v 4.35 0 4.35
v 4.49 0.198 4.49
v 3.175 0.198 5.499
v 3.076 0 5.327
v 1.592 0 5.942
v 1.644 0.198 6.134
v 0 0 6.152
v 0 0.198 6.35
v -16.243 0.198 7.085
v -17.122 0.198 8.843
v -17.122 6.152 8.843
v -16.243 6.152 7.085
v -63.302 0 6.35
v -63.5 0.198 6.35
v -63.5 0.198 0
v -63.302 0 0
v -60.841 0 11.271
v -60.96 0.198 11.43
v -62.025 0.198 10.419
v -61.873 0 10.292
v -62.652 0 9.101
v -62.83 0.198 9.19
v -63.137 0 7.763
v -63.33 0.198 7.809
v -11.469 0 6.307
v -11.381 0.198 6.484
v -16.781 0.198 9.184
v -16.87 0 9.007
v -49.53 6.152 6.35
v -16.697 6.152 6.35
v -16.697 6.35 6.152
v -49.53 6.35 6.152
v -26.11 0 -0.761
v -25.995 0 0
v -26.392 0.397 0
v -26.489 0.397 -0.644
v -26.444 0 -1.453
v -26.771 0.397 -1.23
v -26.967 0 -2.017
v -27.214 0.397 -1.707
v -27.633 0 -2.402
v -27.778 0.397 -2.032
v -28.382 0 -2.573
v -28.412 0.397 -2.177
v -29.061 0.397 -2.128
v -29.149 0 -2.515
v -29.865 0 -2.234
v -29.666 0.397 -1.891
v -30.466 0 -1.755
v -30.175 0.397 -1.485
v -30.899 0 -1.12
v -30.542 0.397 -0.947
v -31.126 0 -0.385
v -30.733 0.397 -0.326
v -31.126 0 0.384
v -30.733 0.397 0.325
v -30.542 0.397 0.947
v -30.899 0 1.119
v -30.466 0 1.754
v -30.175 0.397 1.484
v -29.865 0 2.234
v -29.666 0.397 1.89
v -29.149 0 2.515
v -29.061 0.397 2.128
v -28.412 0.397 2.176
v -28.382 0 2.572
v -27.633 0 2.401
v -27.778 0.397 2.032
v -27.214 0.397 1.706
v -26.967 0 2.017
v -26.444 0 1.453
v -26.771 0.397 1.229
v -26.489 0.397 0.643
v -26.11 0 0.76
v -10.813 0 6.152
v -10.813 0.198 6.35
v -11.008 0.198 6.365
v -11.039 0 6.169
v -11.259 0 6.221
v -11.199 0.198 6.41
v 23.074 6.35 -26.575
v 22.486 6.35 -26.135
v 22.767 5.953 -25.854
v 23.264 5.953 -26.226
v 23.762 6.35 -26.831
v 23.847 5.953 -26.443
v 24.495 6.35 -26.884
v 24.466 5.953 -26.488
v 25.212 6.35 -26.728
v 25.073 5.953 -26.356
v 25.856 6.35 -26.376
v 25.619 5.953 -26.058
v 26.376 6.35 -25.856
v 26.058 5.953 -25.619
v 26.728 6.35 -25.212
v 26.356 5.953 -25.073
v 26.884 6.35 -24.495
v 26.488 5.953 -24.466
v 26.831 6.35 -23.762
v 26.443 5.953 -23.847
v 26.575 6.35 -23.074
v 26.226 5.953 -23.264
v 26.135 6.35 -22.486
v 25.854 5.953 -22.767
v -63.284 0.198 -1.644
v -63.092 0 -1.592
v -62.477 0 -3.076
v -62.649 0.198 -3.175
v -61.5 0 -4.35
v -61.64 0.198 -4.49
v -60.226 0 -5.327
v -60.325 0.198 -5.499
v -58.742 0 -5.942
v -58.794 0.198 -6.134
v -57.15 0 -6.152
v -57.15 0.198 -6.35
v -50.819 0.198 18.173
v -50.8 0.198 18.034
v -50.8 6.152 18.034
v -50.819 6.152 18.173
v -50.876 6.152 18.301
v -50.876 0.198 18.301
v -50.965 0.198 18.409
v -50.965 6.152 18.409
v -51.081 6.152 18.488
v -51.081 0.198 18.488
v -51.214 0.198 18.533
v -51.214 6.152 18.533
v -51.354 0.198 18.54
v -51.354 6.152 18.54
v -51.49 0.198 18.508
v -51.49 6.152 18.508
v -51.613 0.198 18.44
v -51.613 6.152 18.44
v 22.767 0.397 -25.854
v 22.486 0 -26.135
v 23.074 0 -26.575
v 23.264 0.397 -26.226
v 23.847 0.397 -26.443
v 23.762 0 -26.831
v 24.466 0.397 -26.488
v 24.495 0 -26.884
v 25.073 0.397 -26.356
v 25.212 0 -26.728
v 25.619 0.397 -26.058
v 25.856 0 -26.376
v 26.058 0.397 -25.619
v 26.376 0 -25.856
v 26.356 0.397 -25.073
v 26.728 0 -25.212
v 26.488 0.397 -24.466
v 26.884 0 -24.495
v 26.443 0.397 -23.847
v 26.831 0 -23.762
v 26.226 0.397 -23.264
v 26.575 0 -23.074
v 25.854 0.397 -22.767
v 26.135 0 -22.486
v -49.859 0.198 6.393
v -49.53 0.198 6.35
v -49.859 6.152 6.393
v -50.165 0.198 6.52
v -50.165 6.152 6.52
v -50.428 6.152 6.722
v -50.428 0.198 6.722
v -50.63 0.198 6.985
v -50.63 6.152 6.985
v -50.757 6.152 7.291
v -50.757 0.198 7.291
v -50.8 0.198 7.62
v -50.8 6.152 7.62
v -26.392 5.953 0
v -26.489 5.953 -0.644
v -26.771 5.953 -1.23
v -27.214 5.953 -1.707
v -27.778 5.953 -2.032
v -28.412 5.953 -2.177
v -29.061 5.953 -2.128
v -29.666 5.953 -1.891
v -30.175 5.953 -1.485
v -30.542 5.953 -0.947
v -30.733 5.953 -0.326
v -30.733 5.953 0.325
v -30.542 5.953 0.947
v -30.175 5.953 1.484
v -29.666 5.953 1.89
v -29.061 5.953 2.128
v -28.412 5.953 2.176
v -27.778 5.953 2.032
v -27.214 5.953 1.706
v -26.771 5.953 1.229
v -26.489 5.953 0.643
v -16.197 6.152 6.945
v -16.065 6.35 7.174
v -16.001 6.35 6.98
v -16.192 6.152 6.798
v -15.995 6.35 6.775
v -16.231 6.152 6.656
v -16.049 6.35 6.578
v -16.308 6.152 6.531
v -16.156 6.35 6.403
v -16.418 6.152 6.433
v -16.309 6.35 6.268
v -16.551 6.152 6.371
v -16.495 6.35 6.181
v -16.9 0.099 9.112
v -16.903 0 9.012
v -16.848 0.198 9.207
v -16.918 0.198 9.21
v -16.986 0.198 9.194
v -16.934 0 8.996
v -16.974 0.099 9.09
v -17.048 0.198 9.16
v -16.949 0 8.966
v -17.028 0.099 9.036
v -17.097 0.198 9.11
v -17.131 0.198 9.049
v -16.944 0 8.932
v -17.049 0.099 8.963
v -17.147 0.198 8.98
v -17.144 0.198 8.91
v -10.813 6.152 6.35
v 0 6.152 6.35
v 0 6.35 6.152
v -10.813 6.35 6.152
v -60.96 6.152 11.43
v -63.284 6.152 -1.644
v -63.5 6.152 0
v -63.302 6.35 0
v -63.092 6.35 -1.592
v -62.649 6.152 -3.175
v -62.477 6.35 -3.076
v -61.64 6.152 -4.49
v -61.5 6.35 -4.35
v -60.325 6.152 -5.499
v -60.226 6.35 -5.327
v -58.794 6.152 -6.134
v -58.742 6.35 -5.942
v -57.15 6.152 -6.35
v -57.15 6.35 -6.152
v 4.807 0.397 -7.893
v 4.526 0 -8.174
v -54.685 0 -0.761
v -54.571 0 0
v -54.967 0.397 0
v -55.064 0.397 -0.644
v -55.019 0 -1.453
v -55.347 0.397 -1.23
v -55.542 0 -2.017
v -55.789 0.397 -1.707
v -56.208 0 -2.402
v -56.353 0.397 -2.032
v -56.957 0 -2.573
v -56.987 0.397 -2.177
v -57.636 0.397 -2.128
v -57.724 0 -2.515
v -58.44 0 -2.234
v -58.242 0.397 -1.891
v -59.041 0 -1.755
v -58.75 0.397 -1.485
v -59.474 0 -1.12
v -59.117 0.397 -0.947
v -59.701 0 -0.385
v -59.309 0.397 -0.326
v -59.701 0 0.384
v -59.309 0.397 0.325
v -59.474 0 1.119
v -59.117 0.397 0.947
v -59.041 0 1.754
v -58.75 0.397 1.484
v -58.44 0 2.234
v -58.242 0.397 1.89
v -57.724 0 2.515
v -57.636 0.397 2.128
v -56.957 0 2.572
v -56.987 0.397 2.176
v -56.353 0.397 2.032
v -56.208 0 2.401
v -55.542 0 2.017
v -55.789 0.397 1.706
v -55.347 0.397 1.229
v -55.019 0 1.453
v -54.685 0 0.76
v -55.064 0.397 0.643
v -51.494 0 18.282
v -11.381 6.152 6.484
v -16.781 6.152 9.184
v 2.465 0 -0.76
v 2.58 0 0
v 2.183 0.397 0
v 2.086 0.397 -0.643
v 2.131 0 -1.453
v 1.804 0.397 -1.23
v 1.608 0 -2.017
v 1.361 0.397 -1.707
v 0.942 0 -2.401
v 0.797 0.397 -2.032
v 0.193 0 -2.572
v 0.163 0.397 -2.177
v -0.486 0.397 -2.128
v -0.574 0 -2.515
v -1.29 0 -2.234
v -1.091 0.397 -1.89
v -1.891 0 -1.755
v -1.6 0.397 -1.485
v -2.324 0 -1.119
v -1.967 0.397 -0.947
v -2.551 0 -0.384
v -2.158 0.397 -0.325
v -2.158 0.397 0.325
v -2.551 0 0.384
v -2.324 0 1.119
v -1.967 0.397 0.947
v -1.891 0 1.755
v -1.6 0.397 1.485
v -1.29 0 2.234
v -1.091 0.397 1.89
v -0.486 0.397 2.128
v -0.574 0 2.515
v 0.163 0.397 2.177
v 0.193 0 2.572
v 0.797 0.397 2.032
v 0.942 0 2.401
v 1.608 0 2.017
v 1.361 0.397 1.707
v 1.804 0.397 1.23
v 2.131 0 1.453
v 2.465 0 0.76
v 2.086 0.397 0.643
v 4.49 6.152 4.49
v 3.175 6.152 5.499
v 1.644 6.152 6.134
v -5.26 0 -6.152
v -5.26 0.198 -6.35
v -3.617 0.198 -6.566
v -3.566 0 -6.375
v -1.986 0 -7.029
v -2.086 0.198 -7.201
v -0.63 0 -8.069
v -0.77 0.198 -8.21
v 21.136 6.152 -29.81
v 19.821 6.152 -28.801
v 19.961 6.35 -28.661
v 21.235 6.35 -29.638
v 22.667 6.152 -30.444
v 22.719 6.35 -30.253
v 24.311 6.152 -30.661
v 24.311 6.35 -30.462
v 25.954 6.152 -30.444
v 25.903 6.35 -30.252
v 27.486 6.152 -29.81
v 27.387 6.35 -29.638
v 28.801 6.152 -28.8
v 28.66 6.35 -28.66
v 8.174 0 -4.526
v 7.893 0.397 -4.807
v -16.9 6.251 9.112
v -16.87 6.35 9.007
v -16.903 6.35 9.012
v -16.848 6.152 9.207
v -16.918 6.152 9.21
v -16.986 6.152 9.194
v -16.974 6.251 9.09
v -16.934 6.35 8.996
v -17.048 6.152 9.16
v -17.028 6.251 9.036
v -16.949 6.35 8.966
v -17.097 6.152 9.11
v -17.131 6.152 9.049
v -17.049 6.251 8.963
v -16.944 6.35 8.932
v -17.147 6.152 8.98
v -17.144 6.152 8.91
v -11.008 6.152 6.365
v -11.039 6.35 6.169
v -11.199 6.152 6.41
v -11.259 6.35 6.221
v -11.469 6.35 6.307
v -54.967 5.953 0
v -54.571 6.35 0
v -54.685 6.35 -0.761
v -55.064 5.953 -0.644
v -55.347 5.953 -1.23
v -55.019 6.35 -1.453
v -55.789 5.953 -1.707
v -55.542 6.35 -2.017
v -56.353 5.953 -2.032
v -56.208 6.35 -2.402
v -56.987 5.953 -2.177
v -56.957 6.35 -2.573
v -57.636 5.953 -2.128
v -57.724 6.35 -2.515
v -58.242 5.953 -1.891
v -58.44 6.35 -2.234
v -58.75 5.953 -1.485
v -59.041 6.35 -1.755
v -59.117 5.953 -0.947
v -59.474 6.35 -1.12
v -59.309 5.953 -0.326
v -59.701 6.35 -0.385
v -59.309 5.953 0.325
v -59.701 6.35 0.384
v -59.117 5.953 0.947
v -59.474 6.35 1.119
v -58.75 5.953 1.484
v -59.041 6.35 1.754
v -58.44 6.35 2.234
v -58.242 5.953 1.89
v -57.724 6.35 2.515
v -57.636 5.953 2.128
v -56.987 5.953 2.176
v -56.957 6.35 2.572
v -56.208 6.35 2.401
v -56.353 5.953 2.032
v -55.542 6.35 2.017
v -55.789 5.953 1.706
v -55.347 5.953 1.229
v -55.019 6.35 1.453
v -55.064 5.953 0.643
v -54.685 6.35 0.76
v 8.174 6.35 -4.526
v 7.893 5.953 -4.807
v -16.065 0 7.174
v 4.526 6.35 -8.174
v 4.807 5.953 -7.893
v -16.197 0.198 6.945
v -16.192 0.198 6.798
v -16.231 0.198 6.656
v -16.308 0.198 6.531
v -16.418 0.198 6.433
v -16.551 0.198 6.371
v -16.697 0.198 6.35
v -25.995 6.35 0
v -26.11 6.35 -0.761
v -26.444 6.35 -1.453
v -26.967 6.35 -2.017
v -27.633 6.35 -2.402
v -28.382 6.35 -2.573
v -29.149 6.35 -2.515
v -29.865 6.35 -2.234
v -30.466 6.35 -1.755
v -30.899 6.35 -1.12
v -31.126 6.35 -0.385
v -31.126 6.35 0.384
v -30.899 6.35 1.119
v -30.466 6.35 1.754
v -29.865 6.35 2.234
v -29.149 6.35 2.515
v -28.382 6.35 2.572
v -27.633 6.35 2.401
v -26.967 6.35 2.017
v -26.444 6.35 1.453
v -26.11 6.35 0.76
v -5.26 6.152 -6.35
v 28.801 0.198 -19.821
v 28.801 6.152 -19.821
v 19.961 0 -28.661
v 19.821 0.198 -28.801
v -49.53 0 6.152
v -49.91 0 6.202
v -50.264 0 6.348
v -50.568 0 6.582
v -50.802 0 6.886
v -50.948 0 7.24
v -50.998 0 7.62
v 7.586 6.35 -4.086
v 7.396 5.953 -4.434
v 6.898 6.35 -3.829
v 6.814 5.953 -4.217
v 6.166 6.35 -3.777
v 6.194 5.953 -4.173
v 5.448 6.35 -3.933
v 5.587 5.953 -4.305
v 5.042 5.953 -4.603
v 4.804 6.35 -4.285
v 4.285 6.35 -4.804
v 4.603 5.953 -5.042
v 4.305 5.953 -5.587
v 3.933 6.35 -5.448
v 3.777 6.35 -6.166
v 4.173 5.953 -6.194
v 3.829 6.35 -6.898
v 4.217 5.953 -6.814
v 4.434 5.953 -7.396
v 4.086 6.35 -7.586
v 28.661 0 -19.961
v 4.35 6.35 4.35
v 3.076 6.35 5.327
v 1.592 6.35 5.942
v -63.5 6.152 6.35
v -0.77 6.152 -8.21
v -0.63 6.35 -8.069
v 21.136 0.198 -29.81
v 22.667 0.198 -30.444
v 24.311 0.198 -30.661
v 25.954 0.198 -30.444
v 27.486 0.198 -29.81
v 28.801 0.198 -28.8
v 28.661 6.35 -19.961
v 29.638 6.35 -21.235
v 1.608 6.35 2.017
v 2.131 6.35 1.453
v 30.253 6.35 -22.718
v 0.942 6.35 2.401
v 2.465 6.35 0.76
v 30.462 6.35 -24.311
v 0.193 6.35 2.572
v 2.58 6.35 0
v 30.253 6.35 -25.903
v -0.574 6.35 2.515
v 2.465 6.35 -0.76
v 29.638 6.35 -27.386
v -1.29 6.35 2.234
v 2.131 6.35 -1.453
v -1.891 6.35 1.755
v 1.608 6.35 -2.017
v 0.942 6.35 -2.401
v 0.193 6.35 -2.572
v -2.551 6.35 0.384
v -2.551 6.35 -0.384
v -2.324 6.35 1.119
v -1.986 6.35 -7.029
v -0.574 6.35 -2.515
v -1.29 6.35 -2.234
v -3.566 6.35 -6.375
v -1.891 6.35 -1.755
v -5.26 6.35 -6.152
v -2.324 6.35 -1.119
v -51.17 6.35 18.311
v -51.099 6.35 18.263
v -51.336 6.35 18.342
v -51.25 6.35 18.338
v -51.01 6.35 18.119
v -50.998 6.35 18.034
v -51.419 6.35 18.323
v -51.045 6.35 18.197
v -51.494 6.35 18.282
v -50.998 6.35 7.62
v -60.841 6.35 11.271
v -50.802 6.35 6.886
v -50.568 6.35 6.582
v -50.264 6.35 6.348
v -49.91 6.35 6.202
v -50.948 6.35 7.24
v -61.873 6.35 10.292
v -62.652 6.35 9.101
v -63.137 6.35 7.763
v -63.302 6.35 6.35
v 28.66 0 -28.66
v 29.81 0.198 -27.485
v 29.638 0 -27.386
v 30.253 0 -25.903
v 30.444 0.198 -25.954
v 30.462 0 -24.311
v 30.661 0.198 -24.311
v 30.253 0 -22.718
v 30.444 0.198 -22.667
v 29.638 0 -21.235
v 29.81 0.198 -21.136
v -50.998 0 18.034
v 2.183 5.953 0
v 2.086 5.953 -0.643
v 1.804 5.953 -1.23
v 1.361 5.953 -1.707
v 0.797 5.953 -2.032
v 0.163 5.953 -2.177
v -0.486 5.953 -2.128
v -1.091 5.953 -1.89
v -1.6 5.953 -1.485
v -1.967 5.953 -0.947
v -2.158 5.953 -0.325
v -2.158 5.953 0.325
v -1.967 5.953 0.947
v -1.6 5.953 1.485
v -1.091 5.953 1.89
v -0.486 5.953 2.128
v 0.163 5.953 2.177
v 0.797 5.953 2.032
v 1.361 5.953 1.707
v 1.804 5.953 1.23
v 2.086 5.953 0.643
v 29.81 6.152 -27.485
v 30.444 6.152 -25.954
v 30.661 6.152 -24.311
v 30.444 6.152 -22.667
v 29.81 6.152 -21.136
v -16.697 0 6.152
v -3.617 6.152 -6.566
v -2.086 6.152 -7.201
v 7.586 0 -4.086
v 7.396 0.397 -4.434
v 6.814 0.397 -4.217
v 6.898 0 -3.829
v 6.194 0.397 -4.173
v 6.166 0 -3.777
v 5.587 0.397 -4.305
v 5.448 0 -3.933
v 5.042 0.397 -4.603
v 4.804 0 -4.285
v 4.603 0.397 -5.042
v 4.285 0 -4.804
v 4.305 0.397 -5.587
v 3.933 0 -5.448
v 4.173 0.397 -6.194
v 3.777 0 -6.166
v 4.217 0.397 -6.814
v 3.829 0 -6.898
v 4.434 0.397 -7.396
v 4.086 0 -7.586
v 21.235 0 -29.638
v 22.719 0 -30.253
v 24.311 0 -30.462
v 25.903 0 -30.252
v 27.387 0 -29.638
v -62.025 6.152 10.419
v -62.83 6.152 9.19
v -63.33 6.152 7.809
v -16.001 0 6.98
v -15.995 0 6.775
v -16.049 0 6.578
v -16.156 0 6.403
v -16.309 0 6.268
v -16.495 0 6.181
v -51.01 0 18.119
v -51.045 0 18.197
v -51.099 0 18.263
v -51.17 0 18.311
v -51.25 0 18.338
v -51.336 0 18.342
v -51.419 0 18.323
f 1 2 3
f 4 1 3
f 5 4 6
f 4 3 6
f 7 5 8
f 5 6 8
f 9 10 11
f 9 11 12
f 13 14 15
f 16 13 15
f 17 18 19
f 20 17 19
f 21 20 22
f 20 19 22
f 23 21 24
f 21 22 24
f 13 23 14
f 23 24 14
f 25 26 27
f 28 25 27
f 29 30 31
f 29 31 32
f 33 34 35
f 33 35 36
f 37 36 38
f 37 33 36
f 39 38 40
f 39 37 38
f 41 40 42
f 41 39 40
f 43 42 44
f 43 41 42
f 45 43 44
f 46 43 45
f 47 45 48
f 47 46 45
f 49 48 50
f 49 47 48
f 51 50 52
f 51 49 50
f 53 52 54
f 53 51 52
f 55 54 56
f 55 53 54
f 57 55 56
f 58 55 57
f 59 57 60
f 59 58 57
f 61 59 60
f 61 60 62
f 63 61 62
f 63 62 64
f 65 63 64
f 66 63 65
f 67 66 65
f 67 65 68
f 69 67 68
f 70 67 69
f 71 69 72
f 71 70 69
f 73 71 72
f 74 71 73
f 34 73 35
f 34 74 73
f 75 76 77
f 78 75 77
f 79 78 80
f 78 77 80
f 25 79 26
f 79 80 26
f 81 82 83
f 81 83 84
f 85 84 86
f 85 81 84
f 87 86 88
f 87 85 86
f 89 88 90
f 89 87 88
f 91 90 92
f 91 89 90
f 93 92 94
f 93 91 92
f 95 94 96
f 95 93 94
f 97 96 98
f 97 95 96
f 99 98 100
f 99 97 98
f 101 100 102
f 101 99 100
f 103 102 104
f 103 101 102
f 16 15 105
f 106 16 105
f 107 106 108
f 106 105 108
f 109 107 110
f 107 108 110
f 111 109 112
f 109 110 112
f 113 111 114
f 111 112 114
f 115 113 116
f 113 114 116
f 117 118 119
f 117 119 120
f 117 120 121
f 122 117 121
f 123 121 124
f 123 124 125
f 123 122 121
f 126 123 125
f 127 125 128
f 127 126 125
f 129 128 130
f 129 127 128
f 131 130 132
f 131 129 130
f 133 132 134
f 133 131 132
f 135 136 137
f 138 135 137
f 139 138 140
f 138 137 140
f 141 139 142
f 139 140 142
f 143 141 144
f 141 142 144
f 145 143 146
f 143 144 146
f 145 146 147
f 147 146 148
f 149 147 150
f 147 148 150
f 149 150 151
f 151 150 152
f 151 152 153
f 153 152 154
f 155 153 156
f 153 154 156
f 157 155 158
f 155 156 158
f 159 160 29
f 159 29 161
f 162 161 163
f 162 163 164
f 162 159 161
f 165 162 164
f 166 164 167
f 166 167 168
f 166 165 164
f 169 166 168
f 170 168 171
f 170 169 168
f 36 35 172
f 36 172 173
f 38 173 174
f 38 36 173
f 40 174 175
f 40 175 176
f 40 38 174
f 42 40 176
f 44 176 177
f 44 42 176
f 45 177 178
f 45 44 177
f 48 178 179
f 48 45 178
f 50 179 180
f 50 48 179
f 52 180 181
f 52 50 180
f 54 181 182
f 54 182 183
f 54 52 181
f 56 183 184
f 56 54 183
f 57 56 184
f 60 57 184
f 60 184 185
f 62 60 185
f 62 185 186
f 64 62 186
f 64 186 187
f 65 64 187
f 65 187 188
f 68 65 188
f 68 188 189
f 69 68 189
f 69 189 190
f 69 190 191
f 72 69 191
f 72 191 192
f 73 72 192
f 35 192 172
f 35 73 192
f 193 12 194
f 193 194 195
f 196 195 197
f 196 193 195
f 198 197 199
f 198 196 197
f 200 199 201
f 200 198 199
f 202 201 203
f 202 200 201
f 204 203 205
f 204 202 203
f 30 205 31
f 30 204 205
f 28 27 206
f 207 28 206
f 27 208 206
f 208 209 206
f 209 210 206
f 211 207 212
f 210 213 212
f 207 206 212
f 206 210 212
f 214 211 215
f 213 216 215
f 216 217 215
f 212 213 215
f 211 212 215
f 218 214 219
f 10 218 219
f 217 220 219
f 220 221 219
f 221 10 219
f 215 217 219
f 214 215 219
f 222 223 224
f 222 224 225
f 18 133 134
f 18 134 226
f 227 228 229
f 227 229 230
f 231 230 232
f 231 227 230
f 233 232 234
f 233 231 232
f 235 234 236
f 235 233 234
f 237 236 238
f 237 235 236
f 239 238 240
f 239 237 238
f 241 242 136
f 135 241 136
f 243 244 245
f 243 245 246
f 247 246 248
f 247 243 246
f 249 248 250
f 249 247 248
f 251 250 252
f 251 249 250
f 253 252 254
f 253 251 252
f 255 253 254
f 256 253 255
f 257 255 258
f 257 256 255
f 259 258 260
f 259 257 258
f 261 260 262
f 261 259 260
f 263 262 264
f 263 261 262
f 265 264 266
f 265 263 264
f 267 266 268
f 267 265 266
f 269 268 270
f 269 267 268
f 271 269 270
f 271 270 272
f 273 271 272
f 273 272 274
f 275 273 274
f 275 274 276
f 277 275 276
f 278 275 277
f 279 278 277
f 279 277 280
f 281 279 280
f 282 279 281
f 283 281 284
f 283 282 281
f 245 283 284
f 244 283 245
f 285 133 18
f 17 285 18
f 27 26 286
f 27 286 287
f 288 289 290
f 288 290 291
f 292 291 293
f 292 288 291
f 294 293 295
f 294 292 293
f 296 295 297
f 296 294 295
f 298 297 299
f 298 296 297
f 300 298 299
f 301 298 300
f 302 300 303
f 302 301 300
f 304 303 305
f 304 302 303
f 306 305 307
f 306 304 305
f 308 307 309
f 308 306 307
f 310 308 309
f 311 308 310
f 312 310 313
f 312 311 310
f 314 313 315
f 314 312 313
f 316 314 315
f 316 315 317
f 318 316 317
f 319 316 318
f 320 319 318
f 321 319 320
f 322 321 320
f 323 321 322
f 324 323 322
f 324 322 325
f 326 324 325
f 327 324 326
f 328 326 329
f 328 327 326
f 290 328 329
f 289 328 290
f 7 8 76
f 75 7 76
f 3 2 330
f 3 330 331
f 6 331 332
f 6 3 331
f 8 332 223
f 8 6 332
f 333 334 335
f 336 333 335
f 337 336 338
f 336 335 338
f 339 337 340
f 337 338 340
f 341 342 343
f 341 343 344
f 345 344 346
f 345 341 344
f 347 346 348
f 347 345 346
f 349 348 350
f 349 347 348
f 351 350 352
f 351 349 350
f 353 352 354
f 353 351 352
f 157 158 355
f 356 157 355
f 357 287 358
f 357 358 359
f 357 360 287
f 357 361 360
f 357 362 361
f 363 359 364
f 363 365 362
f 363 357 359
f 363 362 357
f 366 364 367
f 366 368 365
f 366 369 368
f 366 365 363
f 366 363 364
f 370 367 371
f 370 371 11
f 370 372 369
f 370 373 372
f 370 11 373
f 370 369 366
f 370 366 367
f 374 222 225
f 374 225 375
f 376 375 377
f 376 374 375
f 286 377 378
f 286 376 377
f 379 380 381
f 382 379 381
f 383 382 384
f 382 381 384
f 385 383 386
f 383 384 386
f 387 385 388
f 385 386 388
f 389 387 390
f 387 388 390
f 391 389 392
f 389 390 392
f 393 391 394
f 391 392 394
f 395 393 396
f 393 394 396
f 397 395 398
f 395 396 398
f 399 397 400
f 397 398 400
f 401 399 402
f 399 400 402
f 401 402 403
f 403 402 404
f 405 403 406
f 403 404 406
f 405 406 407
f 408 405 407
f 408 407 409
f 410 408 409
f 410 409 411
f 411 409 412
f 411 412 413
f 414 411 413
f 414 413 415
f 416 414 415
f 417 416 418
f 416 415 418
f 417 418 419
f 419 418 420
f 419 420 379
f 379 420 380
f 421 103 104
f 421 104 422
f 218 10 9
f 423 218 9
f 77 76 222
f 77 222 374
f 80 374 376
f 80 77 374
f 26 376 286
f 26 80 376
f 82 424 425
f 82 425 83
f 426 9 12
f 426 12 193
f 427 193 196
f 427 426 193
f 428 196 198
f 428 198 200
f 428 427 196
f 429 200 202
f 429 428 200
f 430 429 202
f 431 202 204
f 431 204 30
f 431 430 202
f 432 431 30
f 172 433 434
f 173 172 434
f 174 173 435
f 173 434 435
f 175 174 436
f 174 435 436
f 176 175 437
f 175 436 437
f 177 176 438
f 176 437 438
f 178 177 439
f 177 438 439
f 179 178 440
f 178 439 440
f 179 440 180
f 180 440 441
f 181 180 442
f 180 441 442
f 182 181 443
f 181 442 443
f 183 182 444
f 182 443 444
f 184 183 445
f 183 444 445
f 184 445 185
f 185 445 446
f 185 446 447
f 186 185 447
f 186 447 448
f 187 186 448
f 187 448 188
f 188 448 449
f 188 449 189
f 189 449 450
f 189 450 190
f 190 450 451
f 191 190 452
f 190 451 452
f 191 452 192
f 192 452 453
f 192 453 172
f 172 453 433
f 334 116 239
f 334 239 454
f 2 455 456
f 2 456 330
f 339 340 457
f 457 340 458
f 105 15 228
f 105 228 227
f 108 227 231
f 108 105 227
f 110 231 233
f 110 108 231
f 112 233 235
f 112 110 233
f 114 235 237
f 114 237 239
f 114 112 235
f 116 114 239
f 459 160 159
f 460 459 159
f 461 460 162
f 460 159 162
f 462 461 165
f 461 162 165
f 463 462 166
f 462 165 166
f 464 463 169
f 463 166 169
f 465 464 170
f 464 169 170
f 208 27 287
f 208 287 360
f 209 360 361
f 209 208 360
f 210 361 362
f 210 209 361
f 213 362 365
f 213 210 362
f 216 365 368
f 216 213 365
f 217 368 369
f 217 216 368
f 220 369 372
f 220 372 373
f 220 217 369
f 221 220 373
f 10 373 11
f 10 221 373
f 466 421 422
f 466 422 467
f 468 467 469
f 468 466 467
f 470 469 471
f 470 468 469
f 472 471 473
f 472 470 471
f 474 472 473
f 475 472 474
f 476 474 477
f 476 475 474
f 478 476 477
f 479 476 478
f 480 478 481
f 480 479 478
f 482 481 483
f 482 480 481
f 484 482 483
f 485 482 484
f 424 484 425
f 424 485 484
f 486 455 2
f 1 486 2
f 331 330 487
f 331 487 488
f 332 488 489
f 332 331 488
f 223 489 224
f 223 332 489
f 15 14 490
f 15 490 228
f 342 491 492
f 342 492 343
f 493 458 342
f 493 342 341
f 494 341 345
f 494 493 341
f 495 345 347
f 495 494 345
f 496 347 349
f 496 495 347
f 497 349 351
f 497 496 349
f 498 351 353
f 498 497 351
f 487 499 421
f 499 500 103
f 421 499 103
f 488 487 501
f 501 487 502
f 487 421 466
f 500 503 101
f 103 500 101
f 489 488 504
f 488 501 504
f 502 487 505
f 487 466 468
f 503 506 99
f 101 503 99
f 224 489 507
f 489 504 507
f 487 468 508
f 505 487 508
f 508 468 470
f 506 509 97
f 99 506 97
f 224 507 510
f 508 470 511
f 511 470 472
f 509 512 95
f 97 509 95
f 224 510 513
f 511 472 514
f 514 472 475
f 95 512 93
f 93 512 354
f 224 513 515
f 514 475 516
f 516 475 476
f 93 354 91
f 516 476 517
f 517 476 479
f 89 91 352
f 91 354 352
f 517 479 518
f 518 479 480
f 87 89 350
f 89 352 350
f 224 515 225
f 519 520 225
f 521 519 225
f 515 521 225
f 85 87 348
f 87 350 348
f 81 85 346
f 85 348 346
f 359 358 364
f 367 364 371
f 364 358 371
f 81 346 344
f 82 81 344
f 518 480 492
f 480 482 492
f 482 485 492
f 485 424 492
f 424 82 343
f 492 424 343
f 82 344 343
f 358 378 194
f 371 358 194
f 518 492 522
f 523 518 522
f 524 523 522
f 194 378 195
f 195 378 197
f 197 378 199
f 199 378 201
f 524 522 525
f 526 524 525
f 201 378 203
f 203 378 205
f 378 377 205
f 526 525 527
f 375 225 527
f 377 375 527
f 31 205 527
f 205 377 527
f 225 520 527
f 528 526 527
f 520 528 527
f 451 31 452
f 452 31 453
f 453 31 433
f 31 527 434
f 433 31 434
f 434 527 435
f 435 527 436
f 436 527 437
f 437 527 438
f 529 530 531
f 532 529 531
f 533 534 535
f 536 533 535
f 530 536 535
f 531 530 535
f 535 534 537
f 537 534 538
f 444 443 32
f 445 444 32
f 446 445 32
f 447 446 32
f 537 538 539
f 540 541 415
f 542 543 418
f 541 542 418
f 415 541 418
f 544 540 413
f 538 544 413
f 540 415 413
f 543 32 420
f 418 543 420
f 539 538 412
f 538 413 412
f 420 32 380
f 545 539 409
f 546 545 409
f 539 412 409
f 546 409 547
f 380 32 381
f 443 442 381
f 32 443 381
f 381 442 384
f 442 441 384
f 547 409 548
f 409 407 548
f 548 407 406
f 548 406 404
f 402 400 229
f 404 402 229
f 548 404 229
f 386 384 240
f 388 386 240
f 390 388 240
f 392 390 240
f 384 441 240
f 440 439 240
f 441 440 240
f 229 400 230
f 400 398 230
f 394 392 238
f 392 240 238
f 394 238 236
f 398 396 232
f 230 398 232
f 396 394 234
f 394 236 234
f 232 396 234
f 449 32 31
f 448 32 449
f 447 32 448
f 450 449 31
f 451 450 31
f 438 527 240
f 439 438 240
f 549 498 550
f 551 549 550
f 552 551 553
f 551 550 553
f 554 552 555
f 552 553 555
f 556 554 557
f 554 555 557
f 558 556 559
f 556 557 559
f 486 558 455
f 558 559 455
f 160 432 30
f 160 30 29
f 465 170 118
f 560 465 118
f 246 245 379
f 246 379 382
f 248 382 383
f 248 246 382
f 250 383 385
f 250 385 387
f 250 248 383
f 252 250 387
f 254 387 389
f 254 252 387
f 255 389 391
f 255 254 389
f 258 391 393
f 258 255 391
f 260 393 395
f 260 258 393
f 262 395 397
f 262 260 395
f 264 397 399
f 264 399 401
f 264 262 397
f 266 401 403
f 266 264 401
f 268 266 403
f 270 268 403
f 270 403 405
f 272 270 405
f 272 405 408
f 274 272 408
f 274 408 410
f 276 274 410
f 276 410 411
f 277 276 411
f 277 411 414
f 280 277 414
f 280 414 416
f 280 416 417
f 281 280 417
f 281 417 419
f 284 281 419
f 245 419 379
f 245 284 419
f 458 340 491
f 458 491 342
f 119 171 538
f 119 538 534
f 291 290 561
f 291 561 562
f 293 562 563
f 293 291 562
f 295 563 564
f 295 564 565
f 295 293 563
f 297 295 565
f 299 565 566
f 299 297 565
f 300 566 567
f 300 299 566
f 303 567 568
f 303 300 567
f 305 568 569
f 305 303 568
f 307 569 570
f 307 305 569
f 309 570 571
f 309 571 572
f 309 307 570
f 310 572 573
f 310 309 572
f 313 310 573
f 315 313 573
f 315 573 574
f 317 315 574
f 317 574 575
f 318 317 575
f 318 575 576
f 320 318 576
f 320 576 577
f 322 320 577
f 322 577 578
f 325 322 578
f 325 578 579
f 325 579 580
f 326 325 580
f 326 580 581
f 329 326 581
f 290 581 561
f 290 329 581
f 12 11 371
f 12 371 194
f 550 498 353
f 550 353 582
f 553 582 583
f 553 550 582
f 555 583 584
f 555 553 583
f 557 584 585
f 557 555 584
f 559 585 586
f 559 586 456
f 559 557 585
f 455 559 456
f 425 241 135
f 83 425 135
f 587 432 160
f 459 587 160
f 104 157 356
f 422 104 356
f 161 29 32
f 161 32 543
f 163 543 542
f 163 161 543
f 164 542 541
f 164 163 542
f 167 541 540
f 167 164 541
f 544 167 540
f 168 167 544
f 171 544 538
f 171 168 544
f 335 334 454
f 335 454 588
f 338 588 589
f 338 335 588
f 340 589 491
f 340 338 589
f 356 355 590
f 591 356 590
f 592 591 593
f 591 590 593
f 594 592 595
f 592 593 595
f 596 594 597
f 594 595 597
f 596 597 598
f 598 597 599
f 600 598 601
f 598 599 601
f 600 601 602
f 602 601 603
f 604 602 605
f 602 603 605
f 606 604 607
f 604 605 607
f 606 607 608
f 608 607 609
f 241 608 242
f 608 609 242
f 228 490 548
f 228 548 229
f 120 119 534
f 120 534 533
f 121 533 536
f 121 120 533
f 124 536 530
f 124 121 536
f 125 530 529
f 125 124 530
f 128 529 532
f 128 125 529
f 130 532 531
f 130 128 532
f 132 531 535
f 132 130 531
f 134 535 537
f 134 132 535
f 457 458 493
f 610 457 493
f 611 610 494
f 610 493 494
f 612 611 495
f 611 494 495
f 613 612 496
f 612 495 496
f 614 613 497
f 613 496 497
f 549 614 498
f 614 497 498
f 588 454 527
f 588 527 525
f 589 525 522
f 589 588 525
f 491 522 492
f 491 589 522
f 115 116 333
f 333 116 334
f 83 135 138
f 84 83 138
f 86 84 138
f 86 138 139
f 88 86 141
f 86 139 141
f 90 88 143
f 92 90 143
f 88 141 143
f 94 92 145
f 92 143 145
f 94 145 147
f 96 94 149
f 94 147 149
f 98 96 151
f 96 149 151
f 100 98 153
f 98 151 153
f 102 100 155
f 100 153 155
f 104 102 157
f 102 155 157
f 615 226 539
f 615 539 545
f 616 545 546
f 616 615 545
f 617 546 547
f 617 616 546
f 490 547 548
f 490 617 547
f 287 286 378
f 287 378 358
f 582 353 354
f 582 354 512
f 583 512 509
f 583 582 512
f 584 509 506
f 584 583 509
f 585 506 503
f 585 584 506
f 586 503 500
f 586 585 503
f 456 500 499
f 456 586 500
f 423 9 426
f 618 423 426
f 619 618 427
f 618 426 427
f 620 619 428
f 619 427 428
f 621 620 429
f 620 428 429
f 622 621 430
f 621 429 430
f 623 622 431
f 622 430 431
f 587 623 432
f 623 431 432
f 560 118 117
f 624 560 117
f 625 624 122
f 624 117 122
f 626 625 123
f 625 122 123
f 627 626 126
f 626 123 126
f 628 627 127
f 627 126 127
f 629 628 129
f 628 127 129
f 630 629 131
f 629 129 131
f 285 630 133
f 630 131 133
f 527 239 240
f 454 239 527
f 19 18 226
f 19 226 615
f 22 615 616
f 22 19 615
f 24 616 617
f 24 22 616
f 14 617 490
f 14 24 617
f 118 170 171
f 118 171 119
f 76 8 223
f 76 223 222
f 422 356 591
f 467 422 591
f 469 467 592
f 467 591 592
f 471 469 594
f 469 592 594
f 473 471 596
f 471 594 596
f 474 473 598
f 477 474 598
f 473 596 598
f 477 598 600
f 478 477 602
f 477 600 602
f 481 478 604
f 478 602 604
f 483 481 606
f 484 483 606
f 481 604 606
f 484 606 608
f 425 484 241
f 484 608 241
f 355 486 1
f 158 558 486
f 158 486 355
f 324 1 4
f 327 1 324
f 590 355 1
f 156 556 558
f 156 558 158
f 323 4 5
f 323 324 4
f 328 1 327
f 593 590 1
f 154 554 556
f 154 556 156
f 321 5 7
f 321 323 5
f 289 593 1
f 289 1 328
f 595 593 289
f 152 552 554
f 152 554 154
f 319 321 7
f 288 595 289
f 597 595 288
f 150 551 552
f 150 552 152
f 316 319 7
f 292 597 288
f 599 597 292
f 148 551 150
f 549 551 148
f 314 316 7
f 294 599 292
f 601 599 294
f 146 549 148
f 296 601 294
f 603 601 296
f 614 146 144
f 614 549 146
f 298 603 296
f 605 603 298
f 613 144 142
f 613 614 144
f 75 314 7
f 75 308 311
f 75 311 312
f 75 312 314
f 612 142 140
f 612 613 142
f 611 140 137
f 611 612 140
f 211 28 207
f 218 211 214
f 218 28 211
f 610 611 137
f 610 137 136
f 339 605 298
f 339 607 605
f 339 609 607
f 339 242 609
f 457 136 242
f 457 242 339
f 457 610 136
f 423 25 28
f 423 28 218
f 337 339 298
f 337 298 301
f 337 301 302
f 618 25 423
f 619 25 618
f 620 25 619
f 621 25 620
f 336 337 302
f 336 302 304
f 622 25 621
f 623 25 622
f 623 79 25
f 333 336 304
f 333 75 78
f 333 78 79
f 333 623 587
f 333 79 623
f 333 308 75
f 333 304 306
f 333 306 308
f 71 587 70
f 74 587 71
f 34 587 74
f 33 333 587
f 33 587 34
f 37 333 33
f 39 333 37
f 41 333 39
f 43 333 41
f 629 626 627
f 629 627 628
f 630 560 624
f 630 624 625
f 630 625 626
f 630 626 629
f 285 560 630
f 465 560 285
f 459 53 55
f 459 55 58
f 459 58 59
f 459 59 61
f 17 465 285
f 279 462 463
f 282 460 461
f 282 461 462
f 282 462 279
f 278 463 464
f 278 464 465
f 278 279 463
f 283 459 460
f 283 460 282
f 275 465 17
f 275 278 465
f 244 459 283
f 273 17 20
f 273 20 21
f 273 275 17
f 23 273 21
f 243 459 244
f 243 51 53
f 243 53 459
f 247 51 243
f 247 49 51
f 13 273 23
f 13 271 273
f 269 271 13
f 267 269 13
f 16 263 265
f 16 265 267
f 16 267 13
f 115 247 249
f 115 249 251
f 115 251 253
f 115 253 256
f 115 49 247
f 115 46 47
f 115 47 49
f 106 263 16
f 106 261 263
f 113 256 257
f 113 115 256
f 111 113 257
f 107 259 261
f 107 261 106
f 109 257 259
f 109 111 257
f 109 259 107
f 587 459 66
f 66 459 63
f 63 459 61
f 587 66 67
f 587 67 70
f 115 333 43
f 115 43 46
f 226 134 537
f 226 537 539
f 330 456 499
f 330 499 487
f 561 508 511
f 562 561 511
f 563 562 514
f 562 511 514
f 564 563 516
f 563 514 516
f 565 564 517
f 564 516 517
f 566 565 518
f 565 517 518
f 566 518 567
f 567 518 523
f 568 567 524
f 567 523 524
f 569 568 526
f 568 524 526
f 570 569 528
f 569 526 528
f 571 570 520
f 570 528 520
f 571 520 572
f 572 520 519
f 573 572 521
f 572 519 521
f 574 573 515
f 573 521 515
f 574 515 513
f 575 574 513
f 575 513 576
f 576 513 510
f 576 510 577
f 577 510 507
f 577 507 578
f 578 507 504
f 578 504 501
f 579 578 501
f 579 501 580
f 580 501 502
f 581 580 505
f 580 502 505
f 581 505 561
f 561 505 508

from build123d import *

# Parameters (mm, degrees)
SKETCH1_R           = 2.1828125
BOSS_EXTRUDE1_DEPTH = 6.35
CHAMFER2_SIZE       = 0.396875
CHAMFER3_SIZE       = 0.1984375


with BuildPart() as part:
    # Sketch1 → Boss-Extrude1 (new body)
    with BuildSketch(Plane(origin=(0, 0, 0), x_dir=(1, 0, 0), z_dir=(0, 1, 0))):
        with BuildLine():
            Line((-50.8, -7.62), (-50.8, -18.034))
            ThreePointArc((-50.8, -18.034), (-51.080815493, -18.488369013), (-51.6128, -18.4404))
            Line((-51.6128, -18.4404), (-60.9601016, -11.4299238))
            ThreePointArc((-60.9601016, -11.4299238), (-62.829639478, -9.189819739), (-63.5, -6.350127))
            Line((-63.5, -6.350127), (-63.5, 0.000254))
            ThreePointArc((-63.5, 0.000254), (-61.640202455, 4.490202455), (-57.150254, 6.35))
            Line((-57.150254, 6.35), (-5.260407032, 6.35))
            ThreePointArc((-5.260407032, 6.35), (-2.830464438, 6.833345634), (-0.770458576, 8.209797545))
            Line((-0.770458576, 8.209797545), (19.820563787, 28.800819908))
            ThreePointArc((19.820563787, 28.800819908), (24.310512242, 30.660617452), (28.800819908, 28.800460698))
            ThreePointArc((28.800819908, 28.800460698), (30.660617452, 24.310512242), (28.800819908, 19.820563787))
            Line((28.800819908, 19.820563787), (4.490053666, -4.490202455))
            ThreePointArc((4.490053666, -4.490202455), (2.430047804, -5.866654366), (0.00010521, -6.35))
            Line((0.00010521, -6.35), (-10.812693667, -6.35))
            ThreePointArc((-10.812693667, -6.35), (-11.104479877, -6.383973783), (-11.380654934, -6.484077467))
            Line((-11.380654934, -6.484077467), (-16.780946479, -9.18422324))
            ThreePointArc((-16.780946479, -9.18422324), (-17.074143855, -9.136643856), (-17.121723239, -8.84344648))
            Line((-17.121723239, -8.84344648), (-16.242592252, -7.085184507))
            ThreePointArc((-16.242592252, -7.085184507), (-16.264830655, -6.590928595), (-16.696961265, -6.35))
            Line((-16.696961265, -6.35), (-49.53, -6.35))
            ThreePointArc((-49.53, -6.35), (-50.428025612, -6.721974388), (-50.8, -7.62))
        make_face()
        Circle(SKETCH1_R, mode=Mode.SUBTRACT)
        with Locations((-57.150254, 0.000254)):
            Circle(SKETCH1_R, mode=Mode.SUBTRACT)
        with Locations((-28.574999999, 0.000254)):
            Circle(SKETCH1_R, mode=Mode.SUBTRACT)
        with BuildLine():
            Line((4.806518479, 7.893481521), (22.767030721, 25.853993763))
            ThreePointArc((22.767030721, 25.853993763), (25.853993763, 25.853993763), (25.853993763, 22.767030721))
            Line((25.853993763, 22.767030721), (7.893481521, 4.806518479))
            ThreePointArc((7.893481521, 4.806518479), (4.806518479, 4.806518479), (4.806518479, 7.893481521))
        make_face(mode=Mode.SUBTRACT)
    extrude(amount=BOSS_EXTRUDE1_DEPTH)

    # Chamfer2
    chamfer2_edges = [part.edges().sort_by_distance(p)[0] for p in [
        (-2.1828125, 0, 0),
        (-2.1828125, 6.35, 0),
        (4.806518479, 0, -4.806518479),
        (16.873737642, 0, -13.7867746),
        (25.853993763, 0, -25.853993763),
        (13.7867746, 0, -16.873737642),
        (4.806518479, 6.35, -4.806518479),
        (16.873737642, 6.35, -13.7867746),
        (25.853993763, 6.35, -25.853993763),
        (13.7867746, 6.35, -16.873737642),
        (-59.3330665, 0, -0.000254),
        (-59.3330665, 6.35, -0.000254),
        (-30.757812499, 0, -0.000254),
        (-30.757812499, 6.35, -0.000254),
    ]]
    chamfer(chamfer2_edges, length=CHAMFER2_SIZE)

    # Chamfer3
    chamfer3_edges = [part.edges().sort_by_distance(p)[0] for p in [
        (-2.830464438, 6.35, -6.833345634),
        (-31.205330516, 6.35, -6.35),
        (-61.640202455, 6.35, -4.490202455),
        (24.310766246, 0, -30.660617447),
        (30.660617452, 0, -24.310512242),
        (16.645436787, 0, -7.665180666),
        (2.430047804, 0, 5.866654366),
        (-5.406294229, 0, 6.35),
        (-11.104479877, 0, 6.383973783),
        (-14.080800707, 0, 7.834150354),
        (-17.074143855, 0, 9.136643856),
        (-16.682157746, 0, 7.964315493),
        (-16.264830655, 0, 6.590928595),
        (-63.5, 6.35, 3.1749365),
        (-33.113480633, 0, 6.35),
        (-50.428025612, 0, 6.721974388),
        (-50.8, 0, 12.827),
        (-51.080815493, 0, 18.488369013),
        (-56.2864508, 0, 14.9351619),
        (-62.829639478, 0, 9.189819739),
        (-63.5, 0, 3.1749365),
        (-61.640202455, 0, -4.490202455),
        (-31.205330516, 0, -6.35),
        (-2.830464438, 0, -6.833345634),
        (-62.829639478, 6.35, 9.189819739),
        (9.525052605, 0, -18.505308726),
        (24.310766246, 0, -30.660617447),
        (-56.2864508, 6.35, 14.9351619),
        (-51.080815493, 6.35, 18.488369013),
        (-50.8, 6.35, 12.827),
        (-50.428025612, 6.35, 6.721974388),
        (-33.113480633, 6.35, 6.35),
        (24.310766246, 6.35, -30.660617447),
        (-16.264830655, 6.35, 6.590928595),
        (-16.682157746, 6.35, 7.964315493),
        (-17.074143855, 6.35, 9.136643856),
        (-14.080800707, 6.35, 7.834150354),
        (-11.104479877, 6.35, 6.383973783),
        (-5.406294229, 6.35, 6.35),
        (2.430047804, 6.35, 5.866654366),
        (16.645436787, 6.35, -7.665180666),
        (30.660617452, 6.35, -24.310512242),
        (24.310766246, 6.35, -30.660617447),
        (9.525052605, 6.35, -18.505308726),
    ]]
    chamfer(chamfer3_edges, length=CHAMFER3_SIZE)


solid = part.part
